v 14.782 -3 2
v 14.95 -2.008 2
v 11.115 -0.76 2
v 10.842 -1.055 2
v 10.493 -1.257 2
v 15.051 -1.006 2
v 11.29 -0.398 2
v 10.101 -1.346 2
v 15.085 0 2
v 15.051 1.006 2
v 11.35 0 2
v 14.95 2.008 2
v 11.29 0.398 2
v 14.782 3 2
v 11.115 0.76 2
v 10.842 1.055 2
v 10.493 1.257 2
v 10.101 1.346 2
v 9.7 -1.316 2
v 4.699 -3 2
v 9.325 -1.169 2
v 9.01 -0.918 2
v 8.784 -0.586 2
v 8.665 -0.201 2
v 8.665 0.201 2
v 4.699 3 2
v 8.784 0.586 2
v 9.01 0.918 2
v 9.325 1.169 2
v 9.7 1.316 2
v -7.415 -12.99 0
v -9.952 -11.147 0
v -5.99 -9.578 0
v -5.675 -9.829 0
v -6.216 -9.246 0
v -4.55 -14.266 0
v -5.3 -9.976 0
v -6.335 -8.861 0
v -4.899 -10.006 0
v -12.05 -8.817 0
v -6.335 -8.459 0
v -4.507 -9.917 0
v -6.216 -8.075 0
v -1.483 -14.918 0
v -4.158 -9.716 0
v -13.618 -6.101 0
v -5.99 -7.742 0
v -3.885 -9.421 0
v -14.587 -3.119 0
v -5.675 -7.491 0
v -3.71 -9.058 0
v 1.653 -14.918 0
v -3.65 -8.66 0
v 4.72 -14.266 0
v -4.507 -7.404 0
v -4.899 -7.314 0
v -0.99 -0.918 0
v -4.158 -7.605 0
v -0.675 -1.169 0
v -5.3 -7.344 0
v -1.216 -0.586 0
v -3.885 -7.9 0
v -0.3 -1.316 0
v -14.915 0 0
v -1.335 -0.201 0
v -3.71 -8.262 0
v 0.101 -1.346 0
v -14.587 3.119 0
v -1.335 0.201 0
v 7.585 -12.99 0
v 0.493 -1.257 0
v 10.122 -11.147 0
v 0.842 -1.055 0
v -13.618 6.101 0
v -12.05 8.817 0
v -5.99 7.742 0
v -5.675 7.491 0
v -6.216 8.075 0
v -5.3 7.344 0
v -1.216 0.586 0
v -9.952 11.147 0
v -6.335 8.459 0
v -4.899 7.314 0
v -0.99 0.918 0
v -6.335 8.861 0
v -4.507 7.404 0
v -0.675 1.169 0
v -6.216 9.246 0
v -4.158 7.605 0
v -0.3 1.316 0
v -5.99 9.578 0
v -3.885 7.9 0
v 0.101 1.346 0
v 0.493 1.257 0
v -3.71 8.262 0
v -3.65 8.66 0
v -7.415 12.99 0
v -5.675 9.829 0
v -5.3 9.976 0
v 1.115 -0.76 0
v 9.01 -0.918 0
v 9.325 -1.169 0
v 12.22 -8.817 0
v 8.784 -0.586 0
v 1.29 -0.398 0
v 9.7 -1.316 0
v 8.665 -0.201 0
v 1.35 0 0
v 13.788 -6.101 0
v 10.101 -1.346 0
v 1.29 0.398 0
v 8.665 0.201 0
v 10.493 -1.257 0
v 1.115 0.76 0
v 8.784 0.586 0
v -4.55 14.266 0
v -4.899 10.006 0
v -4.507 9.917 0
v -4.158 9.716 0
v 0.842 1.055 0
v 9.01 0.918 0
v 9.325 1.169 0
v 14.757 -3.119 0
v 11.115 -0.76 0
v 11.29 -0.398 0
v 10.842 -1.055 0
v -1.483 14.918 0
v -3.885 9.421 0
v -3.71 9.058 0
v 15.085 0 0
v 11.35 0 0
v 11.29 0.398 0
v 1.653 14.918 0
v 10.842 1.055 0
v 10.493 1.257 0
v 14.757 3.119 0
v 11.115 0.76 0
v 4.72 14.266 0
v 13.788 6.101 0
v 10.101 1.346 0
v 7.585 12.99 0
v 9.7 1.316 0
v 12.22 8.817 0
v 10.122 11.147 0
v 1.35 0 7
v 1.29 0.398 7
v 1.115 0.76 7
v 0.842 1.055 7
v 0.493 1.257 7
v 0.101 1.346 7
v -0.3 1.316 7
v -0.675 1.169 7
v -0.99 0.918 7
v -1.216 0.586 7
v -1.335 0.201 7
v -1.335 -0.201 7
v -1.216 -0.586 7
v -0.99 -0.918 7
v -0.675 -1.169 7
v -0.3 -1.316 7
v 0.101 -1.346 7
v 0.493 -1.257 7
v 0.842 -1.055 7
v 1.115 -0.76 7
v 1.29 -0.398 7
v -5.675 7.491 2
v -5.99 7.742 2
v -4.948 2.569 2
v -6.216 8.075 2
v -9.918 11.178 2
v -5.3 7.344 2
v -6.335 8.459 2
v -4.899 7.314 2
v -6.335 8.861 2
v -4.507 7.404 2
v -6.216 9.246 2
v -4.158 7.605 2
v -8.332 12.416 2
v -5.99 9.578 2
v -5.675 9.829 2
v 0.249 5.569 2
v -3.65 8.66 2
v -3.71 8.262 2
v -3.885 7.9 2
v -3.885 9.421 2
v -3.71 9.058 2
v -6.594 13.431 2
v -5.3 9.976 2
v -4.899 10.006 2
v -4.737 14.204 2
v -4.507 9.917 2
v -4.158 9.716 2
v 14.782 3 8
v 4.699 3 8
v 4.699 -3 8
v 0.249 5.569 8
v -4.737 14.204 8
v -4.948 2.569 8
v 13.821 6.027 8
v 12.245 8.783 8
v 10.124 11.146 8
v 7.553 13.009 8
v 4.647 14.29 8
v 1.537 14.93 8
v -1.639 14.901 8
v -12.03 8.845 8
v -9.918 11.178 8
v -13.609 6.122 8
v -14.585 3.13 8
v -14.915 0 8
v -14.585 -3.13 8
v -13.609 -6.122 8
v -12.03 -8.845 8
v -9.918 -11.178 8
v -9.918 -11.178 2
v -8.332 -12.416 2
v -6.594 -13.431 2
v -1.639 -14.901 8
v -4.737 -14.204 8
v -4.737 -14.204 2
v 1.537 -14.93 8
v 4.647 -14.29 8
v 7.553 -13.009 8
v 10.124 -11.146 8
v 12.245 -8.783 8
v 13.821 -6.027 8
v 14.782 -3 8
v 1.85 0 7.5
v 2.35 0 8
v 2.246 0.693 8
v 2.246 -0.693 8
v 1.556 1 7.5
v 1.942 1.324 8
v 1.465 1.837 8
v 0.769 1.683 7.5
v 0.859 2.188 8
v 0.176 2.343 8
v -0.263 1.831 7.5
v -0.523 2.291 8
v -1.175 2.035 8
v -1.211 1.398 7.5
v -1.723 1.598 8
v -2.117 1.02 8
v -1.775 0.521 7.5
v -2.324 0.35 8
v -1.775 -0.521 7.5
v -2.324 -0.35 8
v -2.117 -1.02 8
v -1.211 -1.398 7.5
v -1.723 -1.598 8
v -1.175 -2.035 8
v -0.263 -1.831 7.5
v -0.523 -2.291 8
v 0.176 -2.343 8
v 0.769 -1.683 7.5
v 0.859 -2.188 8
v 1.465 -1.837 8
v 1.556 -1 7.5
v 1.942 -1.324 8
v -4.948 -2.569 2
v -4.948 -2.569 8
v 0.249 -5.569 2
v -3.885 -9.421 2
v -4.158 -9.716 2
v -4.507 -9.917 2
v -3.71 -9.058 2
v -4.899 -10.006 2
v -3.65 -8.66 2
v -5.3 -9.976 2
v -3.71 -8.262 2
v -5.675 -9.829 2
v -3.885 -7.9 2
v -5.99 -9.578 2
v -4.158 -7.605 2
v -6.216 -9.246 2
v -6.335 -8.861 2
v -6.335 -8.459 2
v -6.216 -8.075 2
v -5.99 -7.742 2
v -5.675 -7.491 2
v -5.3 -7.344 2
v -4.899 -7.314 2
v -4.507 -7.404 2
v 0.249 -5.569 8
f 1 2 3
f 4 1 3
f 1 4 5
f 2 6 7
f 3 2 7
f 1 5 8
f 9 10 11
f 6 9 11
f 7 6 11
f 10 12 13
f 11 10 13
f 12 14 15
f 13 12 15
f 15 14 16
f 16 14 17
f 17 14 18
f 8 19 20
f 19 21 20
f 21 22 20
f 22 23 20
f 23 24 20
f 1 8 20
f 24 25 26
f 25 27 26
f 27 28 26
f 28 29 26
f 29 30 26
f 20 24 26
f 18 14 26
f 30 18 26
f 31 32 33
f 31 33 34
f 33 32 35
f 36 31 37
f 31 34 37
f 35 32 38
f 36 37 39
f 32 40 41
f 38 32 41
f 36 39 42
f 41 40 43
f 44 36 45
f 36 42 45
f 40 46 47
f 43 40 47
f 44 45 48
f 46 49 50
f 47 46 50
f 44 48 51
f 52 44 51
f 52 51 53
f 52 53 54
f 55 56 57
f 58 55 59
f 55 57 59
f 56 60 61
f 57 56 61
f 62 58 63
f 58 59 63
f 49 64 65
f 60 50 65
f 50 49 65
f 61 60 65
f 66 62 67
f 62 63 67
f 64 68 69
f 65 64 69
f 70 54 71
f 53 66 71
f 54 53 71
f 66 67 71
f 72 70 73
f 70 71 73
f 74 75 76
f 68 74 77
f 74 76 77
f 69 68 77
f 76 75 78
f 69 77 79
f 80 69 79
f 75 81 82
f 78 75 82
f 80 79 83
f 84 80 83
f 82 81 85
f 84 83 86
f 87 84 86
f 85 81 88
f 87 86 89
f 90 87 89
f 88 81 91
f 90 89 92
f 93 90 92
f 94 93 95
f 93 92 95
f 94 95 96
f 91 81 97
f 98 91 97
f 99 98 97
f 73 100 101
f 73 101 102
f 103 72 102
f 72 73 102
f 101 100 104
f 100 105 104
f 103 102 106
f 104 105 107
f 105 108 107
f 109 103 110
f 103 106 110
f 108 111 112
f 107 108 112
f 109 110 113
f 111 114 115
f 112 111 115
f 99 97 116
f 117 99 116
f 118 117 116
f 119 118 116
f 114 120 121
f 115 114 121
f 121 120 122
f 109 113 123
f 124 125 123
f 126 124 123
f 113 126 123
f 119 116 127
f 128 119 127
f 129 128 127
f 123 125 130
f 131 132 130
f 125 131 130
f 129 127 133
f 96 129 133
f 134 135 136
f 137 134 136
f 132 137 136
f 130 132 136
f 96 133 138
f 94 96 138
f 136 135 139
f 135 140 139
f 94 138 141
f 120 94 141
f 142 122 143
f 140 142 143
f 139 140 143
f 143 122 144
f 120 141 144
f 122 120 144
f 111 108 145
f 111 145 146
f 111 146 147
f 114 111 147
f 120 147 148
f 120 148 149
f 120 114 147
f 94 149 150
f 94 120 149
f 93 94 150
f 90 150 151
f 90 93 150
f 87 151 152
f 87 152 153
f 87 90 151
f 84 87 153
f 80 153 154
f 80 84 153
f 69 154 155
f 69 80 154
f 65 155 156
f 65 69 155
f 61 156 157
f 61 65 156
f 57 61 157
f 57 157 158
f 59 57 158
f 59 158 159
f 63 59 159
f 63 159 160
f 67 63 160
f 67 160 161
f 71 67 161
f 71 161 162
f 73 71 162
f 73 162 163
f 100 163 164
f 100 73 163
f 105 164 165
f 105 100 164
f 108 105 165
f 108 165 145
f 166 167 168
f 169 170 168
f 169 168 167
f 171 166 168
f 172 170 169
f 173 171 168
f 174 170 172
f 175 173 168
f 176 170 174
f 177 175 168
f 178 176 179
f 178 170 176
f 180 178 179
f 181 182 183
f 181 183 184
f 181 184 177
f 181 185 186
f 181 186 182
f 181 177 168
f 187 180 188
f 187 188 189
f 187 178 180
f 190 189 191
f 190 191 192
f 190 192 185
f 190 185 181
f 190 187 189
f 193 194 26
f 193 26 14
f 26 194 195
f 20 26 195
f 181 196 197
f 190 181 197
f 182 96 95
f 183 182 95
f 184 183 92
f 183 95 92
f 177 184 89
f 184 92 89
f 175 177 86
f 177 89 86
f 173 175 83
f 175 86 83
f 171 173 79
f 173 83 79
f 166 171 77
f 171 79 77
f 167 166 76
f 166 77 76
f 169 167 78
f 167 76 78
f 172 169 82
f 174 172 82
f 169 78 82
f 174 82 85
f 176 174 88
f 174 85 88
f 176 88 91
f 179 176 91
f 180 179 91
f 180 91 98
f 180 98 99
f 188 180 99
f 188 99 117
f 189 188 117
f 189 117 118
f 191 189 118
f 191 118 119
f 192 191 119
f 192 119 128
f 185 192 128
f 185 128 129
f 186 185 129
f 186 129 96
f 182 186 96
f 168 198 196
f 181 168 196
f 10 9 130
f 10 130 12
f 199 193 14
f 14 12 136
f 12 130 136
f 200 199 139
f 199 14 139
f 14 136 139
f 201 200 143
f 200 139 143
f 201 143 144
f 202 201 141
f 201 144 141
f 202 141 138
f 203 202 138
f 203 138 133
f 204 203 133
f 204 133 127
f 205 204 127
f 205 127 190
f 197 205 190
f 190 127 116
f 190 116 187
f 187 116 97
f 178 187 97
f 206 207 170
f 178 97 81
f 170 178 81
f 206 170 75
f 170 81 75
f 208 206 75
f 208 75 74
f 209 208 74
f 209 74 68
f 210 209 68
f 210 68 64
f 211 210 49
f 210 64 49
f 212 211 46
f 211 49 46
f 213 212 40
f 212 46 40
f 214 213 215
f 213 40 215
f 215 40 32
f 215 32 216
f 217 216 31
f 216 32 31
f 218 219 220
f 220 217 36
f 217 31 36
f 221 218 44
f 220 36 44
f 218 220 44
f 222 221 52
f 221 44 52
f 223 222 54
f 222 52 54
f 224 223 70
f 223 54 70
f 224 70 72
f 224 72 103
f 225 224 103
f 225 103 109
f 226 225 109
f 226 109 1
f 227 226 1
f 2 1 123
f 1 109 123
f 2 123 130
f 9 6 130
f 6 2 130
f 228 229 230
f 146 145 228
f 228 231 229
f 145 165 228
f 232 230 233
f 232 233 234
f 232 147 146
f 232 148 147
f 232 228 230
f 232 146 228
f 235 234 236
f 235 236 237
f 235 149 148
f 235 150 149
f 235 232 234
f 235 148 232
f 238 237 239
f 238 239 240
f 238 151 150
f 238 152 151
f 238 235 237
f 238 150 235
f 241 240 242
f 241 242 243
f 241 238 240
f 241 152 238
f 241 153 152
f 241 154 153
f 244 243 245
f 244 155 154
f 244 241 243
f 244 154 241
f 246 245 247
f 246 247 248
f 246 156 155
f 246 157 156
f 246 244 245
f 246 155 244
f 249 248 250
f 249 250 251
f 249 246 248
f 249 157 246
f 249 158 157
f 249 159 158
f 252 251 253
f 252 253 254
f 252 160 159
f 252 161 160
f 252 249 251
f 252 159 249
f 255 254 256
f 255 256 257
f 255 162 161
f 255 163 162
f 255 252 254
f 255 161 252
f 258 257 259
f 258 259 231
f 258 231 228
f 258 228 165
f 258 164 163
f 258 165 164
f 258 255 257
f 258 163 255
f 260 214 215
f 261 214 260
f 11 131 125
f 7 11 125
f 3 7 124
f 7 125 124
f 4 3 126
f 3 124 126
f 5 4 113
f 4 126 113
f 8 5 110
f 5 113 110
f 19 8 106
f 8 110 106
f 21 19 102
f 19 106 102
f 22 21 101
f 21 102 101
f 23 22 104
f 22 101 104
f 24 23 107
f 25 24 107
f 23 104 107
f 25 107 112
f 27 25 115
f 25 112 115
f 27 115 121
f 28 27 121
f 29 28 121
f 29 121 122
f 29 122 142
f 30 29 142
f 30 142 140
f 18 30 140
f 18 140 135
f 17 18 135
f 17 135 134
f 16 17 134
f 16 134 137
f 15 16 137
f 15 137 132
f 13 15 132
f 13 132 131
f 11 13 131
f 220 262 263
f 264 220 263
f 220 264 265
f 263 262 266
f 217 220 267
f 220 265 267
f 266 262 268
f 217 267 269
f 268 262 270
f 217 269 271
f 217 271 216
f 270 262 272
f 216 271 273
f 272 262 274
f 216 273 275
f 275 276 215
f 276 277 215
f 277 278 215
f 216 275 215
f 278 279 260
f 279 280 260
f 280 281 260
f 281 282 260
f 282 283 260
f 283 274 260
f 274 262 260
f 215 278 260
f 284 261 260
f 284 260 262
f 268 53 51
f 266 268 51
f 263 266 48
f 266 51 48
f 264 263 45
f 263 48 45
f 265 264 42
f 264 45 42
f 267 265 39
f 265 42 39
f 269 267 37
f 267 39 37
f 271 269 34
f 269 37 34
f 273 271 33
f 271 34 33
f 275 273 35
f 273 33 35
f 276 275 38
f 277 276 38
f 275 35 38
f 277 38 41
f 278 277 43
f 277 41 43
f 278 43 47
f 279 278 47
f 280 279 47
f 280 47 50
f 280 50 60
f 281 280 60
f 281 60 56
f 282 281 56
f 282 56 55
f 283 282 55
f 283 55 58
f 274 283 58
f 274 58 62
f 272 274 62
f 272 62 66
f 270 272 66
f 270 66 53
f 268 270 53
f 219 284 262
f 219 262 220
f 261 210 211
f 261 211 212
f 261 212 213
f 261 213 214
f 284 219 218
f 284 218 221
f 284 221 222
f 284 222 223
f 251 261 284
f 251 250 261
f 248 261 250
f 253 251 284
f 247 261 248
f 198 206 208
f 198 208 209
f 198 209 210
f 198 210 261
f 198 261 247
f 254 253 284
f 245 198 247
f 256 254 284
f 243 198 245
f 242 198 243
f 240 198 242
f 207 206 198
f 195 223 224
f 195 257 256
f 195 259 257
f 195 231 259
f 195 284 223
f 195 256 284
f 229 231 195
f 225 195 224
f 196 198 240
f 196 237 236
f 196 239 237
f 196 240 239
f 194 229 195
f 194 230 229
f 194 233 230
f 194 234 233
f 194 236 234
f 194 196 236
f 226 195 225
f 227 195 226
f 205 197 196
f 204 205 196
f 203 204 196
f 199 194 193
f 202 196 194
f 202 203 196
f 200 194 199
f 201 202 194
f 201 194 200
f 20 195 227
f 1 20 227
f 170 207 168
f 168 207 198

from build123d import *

# Parameters (mm, degrees)
SKETCH_R        = 15
SKETCH_R_2      = 1.35
PAD_DEPTH       = 8
POCKET_DEPTH    = 6
SKETCH002_R     = 1.35
POCKET001_DEPTH = 5
CHAMFER_SIZE    = 1


with BuildPart() as part:
    # Sketch → Pad (new body)
    with BuildSketch(Plane.XY):
        with Locations((0.085228, 0)):
            Circle(SKETCH_R)
        Circle(SKETCH_R_2, mode=Mode.SUBTRACT)
    extrude(amount=PAD_DEPTH)

    # Sketch001 → Pocket (cut)
    with BuildSketch(Plane.XY.offset(8)):
        with BuildLine():
            Line((4.698986, 3), (14.798986, 3))
            ThreePointArc((14.798986, -3), (15.1, 0), (14.798986, 3))
            Line((4.698986, -3), (14.798986, -3))
            Line((4.698986, 3), (4.698986, -3))
        make_face()
        with BuildLine():
            Line((-9.997569, 11.316298), (-4.947569, 2.569442))
            Line((-4.947569, 2.569442), (0.248583, 5.569442))
            Line((0.248583, 5.569442), (-4.801417, 14.316298))
            ThreePointArc((-4.801417, 14.316298), (-7.55, 13.076984), (-9.997569, 11.316298))
        make_face()
        with BuildLine():
            Line((-9.997569, -11.316298), (-4.947569, -2.569442))
            Line((-4.947569, -2.569442), (0.248583, -5.569442))
            Line((0.248583, -5.569442), (-4.801417, -14.316298))
            ThreePointArc((-9.997569, -11.316298), (-7.55, -13.076984), (-4.801417, -14.316298))
        make_face()
    extrude(amount=-POCKET_DEPTH, mode=Mode.SUBTRACT)

    # Sketch002 → Pocket001 (cut)
    with BuildSketch(Plane(origin=(0, 0, 0), x_dir=(1, 0, 0), z_dir=(0, 0, -1))):
        with Locations((10, 0)):
            Circle(SKETCH002_R)
        with Locations((-5, 8.660254)):
            Circle(SKETCH002_R)
        with Locations((-5, -8.660254)):
            Circle(SKETCH002_R)
    extrude(amount=-POCKET001_DEPTH, mode=Mode.SUBTRACT)

    # Chamfer
    chamfer_edges = [part.edges().sort_by_distance(p)[0] for p in [
        (-1.35, 0, 8),
    ]]
    chamfer(chamfer_edges, length=CHAMFER_SIZE)


solid = part.part
